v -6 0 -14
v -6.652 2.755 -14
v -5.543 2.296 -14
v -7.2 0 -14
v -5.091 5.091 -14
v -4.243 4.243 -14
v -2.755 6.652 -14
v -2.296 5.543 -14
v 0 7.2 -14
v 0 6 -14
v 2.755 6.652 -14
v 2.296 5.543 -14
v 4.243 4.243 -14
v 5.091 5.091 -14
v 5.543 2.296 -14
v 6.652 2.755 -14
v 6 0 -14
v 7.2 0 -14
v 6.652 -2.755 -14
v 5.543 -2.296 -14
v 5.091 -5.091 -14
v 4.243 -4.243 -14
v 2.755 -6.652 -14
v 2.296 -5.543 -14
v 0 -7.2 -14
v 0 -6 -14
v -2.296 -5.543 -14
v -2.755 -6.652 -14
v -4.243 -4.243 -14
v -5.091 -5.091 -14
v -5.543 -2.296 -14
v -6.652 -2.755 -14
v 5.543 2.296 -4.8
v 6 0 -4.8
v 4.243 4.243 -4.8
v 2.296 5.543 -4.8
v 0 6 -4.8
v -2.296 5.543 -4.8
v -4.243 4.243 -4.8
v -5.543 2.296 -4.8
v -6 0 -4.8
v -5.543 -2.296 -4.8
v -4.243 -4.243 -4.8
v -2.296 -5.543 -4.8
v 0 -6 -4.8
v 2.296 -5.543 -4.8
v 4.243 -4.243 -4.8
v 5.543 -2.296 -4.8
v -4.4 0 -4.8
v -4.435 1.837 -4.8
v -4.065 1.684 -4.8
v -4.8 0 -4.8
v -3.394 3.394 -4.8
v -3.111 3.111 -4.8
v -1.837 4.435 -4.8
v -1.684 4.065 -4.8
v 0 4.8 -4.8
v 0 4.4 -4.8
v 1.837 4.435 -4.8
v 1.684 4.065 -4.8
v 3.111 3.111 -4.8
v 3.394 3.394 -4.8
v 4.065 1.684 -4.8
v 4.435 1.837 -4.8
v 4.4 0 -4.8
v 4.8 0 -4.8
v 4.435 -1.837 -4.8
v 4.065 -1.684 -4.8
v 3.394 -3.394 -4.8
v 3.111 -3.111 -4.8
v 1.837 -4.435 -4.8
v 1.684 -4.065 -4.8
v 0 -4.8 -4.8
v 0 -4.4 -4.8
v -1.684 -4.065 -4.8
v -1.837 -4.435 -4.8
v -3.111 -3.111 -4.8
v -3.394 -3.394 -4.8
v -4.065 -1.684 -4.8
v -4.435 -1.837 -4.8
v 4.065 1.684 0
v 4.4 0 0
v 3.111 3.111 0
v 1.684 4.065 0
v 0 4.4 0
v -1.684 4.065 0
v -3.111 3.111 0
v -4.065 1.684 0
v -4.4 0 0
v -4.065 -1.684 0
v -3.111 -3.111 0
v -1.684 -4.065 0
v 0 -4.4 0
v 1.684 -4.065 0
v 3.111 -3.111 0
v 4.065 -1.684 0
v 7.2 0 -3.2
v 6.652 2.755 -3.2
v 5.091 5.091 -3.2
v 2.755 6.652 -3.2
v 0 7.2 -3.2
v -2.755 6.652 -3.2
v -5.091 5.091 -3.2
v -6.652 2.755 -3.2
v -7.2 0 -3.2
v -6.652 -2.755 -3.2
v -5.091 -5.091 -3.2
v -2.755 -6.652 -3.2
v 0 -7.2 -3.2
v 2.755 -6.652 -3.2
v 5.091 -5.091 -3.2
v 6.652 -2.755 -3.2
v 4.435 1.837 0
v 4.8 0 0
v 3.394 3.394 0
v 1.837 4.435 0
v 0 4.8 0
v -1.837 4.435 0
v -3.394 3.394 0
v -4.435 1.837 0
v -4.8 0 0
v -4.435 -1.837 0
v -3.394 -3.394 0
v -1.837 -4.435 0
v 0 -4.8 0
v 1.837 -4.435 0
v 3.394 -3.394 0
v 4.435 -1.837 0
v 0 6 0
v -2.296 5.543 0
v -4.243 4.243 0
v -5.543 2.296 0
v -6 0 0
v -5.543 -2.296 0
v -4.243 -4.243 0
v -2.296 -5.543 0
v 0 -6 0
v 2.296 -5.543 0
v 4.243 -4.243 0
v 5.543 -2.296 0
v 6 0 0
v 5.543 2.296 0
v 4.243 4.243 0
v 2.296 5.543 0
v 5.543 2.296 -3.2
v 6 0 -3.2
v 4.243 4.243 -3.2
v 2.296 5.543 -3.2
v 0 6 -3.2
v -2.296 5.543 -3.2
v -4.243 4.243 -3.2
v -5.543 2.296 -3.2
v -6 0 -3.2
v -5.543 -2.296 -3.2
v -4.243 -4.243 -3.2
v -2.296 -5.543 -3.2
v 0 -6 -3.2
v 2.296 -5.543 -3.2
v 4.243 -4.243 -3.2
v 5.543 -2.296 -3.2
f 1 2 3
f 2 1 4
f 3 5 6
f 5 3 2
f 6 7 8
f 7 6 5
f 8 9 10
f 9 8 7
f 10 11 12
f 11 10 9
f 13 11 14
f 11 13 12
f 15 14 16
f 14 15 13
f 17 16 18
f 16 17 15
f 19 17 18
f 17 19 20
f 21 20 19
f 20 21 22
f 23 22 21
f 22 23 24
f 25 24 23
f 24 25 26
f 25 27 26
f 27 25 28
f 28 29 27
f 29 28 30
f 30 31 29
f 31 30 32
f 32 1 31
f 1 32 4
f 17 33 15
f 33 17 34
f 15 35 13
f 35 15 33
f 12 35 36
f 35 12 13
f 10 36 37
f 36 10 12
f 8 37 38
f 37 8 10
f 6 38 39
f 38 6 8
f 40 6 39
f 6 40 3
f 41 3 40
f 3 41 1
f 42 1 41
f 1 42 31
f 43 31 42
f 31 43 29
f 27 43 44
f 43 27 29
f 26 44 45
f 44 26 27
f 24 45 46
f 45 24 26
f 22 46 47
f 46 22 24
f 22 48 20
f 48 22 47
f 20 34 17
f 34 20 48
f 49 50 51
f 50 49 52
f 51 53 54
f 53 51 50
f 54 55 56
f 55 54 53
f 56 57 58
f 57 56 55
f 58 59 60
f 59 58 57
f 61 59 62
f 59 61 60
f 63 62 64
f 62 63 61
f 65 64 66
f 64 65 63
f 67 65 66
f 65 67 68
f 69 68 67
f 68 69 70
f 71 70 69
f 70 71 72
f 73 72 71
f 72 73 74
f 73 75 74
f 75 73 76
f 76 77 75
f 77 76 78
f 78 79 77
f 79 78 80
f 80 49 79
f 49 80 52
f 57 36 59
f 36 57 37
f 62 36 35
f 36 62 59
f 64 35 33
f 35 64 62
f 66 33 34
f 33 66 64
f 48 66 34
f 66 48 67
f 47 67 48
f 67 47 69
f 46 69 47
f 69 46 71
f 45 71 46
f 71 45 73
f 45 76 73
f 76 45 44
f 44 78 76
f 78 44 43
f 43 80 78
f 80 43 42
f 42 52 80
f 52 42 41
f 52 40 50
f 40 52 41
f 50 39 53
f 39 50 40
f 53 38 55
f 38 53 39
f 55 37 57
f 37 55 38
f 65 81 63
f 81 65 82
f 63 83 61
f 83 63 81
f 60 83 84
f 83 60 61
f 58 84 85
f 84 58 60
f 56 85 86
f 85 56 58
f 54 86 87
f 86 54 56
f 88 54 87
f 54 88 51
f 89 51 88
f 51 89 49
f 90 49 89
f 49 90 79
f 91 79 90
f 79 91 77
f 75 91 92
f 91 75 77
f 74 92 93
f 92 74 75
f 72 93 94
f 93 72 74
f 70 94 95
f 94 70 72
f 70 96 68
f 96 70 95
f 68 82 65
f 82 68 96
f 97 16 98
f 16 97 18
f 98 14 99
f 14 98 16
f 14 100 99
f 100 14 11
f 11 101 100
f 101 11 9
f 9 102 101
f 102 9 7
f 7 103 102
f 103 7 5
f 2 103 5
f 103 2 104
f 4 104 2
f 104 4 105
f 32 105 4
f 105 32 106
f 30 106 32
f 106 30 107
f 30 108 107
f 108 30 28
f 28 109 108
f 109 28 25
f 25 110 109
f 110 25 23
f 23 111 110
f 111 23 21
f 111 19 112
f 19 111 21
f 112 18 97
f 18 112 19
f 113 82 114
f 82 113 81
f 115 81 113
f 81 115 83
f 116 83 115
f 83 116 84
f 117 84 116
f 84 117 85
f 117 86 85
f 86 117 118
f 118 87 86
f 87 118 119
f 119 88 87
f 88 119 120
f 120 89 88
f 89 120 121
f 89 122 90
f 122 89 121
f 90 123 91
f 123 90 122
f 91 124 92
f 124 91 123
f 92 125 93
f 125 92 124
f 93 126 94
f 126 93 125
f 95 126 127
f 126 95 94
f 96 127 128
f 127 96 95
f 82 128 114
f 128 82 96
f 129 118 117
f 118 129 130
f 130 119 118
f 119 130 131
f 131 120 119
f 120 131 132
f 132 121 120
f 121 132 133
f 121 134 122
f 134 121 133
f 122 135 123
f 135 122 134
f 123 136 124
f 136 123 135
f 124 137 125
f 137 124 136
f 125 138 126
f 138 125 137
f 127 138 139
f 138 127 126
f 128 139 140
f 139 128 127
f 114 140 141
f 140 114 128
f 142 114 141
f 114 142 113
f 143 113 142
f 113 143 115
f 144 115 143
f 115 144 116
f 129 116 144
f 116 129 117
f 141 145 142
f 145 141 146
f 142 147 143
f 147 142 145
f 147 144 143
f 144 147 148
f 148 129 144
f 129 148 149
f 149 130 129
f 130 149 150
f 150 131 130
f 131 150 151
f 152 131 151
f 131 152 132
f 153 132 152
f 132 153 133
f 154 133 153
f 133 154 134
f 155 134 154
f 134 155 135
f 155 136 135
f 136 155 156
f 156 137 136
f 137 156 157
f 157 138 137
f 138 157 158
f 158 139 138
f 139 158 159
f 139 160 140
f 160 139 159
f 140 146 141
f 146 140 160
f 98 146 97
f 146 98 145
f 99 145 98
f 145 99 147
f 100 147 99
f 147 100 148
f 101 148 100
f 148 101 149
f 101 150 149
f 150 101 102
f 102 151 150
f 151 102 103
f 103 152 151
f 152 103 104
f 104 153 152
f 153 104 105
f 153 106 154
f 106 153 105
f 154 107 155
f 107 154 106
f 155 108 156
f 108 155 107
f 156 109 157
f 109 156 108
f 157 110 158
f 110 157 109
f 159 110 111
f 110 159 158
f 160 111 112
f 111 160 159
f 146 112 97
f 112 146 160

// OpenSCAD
// file: ../p/4-4ring5.scad
use <../lib.scad>
function ldraw_lib__4_4ring5() = [
// 0 Ring  5 x 1.0
// 0 Name: 4-4ring5.dat
// 0 Author: Mark Kennedy [mkennedy]
// 0 !LDRAW_ORG Primitive UPDATE 2012-01
// 0 !LICENSE Licensed under CC BY 4.0 : see CAreadme.txt
// 
// 0 BFC CERTIFY CCW
  [0,"BFC","CERTIFY"],
  [0,"BFC","CCW"],
// 
// 0 !HISTORY 2001-10-23 [pneaster] resequenced quads, corrected winding.
// 0 !HISTORY 2001-12-29 [pneaster] Added BFC.
// 0 !HISTORY 2002-04-25 [PTadmin] Official Update 2002-02
// 0 !HISTORY 2007-06-24 [PTadmin] Header formatted for Contributor Agreement
// 0 !HISTORY 2008-07-01 [PTadmin] Official Update 2008-01
// 0 !HISTORY 2012-02-16 [Philo] Changed to CCW
// 0 !HISTORY 2012-03-30 [PTadmin] Official Update 2012-01
// 
// 
// 4 16 6 0 0 5.5433 0 2.2961 4.6195 0 1.9135 5 0 0
  [4,16,6,0,0,5.5433,0,2.2961,4.6195,0,1.9135,5,0,0],
// 4 16 5.5433 0 2.2961 4.2426 0 4.2426 3.5355 0 3.5355 4.6195 0 1.9135
  [4,16,5.5433,0,2.2961,4.2426,0,4.2426,3.5355,0,3.5355,4.6195,0,1.9135],
// 4 16 4.2426 0 4.2426 2.2961 0 5.5433 1.9135 0 4.6195 3.5355 0 3.5355
  [4,16,4.2426,0,4.2426,2.2961,0,5.5433,1.9135,0,4.6195,3.5355,0,3.5355],
// 4 16 2.2961 0 5.5433 0 0 6 0 0 5 1.9135 0 4.6195
  [4,16,2.2961,0,5.5433,0,0,6,0,0,5,1.9135,0,4.6195],
// 4 16 0 0 6 -2.2961 0 5.5433 -1.9135 0 4.6195 0 0 5
  [4,16,0,0,6,-2.2961,0,5.5433,-1.9135,0,4.6195,0,0,5],
// 4 16 -2.2961 0 5.5433 -4.2426 0 4.2426 -3.5355 0 3.5355 -1.9135 0 4.6195
  [4,16,-2.2961,0,5.5433,-4.2426,0,4.2426,-3.5355,0,3.5355,-1.9135,0,4.6195],
// 4 16 -4.2426 0 4.2426 -5.5433 0 2.2961 -4.6195 0 1.9135 -3.5355 0 3.5355
  [4,16,-4.2426,0,4.2426,-5.5433,0,2.2961,-4.6195,0,1.9135,-3.5355,0,3.5355],
// 4 16 -5.5433 0 2.2961 -6 0 0 -5 0 0 -4.6195 0 1.9135
  [4,16,-5.5433,0,2.2961,-6,0,0,-5,0,0,-4.6195,0,1.9135],
// 4 16 -6 0 0 -5.5433 0 -2.2961 -4.6195 0 -1.9135 -5 0 0
  [4,16,-6,0,0,-5.5433,0,-2.2961,-4.6195,0,-1.9135,-5,0,0],
// 4 16 -5.5433 0 -2.2961 -4.2426 0 -4.2426 -3.5355 0 -3.5355 -4.6195 0 -1.9135
  [4,16,-5.5433,0,-2.2961,-4.2426,0,-4.2426,-3.5355,0,-3.5355,-4.6195,0,-1.9135],
// 4 16 -4.2426 0 -4.2426 -2.2961 0 -5.5433 -1.9135 0 -4.6195 -3.5355 0 -3.5355
  [4,16,-4.2426,0,-4.2426,-2.2961,0,-5.5433,-1.9135,0,-4.6195,-3.5355,0,-3.5355],
// 4 16 -2.2961 0 -5.5433 0 0 -6 0 0 -5 -1.9135 0 -4.6195
  [4,16,-2.2961,0,-5.5433,0,0,-6,0,0,-5,-1.9135,0,-4.6195],
// 4 16 0 0 -6 2.2961 0 -5.5433 1.9135 0 -4.6195 0 0 -5
  [4,16,0,0,-6,2.2961,0,-5.5433,1.9135,0,-4.6195,0,0,-5],
// 4 16 2.2961 0 -5.5433 4.2426 0 -4.2426 3.5355 0 -3.5355 1.9135 0 -4.6195
  [4,16,2.2961,0,-5.5433,4.2426,0,-4.2426,3.5355,0,-3.5355,1.9135,0,-4.6195],
// 4 16 4.2426 0 -4.2426 5.5433 0 -2.2961 4.6195 0 -1.9135 3.5355 0 -3.5355
  [4,16,4.2426,0,-4.2426,5.5433,0,-2.2961,4.6195,0,-1.9135,3.5355,0,-3.5355],
// 4 16 5.5433 0 -2.2961 6 0 0 5 0 0 4.6195 0 -1.9135
  [4,16,5.5433,0,-2.2961,6,0,0,5,0,0,4.6195,0,-1.9135],
];
module ldraw_lib__4_4ring5(step=0, col=false, unit=2/5, alt=false, line=0.2, solid=!$preview)
    makepoly(ldraw_lib__4_4ring5(), step=step, col=col, unit=unit, alt=alt, line=line, solid=solid);
ldraw_lib__4_4ring5(line=0.2);
// file: ../p/4-4ring4.scad
use <../lib.scad>
function ldraw_lib__4_4ring4() = [
// 0 Ring  4 x 1.0
// 0 Name: 4-4ring4.dat
// 0 Author: James Jessiman
// 0 !LDRAW_ORG Primitive UPDATE 2009-01
// 0 !LICENSE Licensed under CC BY 4.0 : see CAreadme.txt
// 
// 0 BFC CERTIFY CCW
  [0,"BFC","CERTIFY"],
  [0,"BFC","CCW"],
// 
// 0 !HISTORY 1998-12-15 [PTadmin] Official Update 1998-10
// 0 !HISTORY 2002-04-08 [BrickCaster] Modified for BFC compliance
// 0 !HISTORY 2002-04-25 [PTadmin] Official Update 2002-02
// 0 !HISTORY 2007-06-24 [PTadmin] Header formatted for Contributor Agreement
// 0 !HISTORY 2008-07-01 [PTadmin] Official Update 2008-01
// 0 !HISTORY 2008-08-26 [cwdee] Switch polygon winding and rename
// 0 !HISTORY 2009-05-02 [PTadmin] Official Update 2009-01
// 
// 
// 4 16 -1.9135 0 4.6195 -1.5308 0 3.6956 0 0 4 0 0 5
  [4,16,-1.9135,0,4.6195,-1.5308,0,3.6956,0,0,4,0,0,5],
// 4 16 -3.5355 0 3.5355 -2.8284 0 2.8284 -1.5308 0 3.6956 -1.9135 0 4.6195
  [4,16,-3.5355,0,3.5355,-2.8284,0,2.8284,-1.5308,0,3.6956,-1.9135,0,4.6195],
// 4 16 -4.6195 0 1.9135 -3.6956 0 1.5308 -2.8284 0 2.8284 -3.5355 0 3.5355
  [4,16,-4.6195,0,1.9135,-3.6956,0,1.5308,-2.8284,0,2.8284,-3.5355,0,3.5355],
// 4 16 -5 0 0 -4 0 0 -3.6956 0 1.5308 -4.6195 0 1.9135
  [4,16,-5,0,0,-4,0,0,-3.6956,0,1.5308,-4.6195,0,1.9135],
// 4 16 -4.6195 0 -1.9135 -3.6956 0 -1.5308 -4 0 0 -5 0 0
  [4,16,-4.6195,0,-1.9135,-3.6956,0,-1.5308,-4,0,0,-5,0,0],
// 4 16 -3.5355 0 -3.5355 -2.8284 0 -2.8284 -3.6956 0 -1.5308 -4.6195 0 -1.9135
  [4,16,-3.5355,0,-3.5355,-2.8284,0,-2.8284,-3.6956,0,-1.5308,-4.6195,0,-1.9135],
// 4 16 -1.9135 0 -4.6195 -1.5308 0 -3.6956 -2.8284 0 -2.8284 -3.5355 0 -3.5355
  [4,16,-1.9135,0,-4.6195,-1.5308,0,-3.6956,-2.8284,0,-2.8284,-3.5355,0,-3.5355],
// 4 16 0 0 -5 0 0 -4 -1.5308 0 -3.6956 -1.9135 0 -4.6195
  [4,16,0,0,-5,0,0,-4,-1.5308,0,-3.6956,-1.9135,0,-4.6195],
// 4 16 1.9135 0 -4.6195 1.5308 0 -3.6956 0 0 -4 0 0 -5
  [4,16,1.9135,0,-4.6195,1.5308,0,-3.6956,0,0,-4,0,0,-5],
// 4 16 3.5355 0 -3.5355 2.8284 0 -2.8284 1.5308 0 -3.6956 1.9135 0 -4.6195
  [4,16,3.5355,0,-3.5355,2.8284,0,-2.8284,1.5308,0,-3.6956,1.9135,0,-4.6195],
// 4 16 4.6195 0 -1.9135 3.6956 0 -1.5308 2.8284 0 -2.8284 3.5355 0 -3.5355
  [4,16,4.6195,0,-1.9135,3.6956,0,-1.5308,2.8284,0,-2.8284,3.5355,0,-3.5355],
// 4 16 5 0 0 4 0 0 3.6956 0 -1.5308 4.6195 0 -1.9135
  [4,16,5,0,0,4,0,0,3.6956,0,-1.5308,4.6195,0,-1.9135],
// 4 16 4.6195 0 1.9135 3.6956 0 1.5308 4 0 0 5 0 0
  [4,16,4.6195,0,1.9135,3.6956,0,1.5308,4,0,0,5,0,0],
// 4 16 3.5355 0 3.5355 2.8284 0 2.8284 3.6956 0 1.5308 4.6195 0 1.9135
  [4,16,3.5355,0,3.5355,2.8284,0,2.8284,3.6956,0,1.5308,4.6195,0,1.9135],
// 4 16 1.9135 0 4.6195 1.5308 0 3.6956 2.8284 0 2.8284 3.5355 0 3.5355
  [4,16,1.9135,0,4.6195,1.5308,0,3.6956,2.8284,0,2.8284,3.5355,0,3.5355],
// 4 16 0 0 5 0 0 4 1.5308 0 3.6956 1.9135 0 4.6195
  [4,16,0,0,5,0,0,4,1.5308,0,3.6956,1.9135,0,4.6195],
// 0
];
module ldraw_lib__4_4ring4(step=0, col=false, unit=2/5, alt=false, line=0.2, solid=!$preview)
    makepoly(ldraw_lib__4_4ring4(), step=step, col=col, unit=unit, alt=alt, line=line, solid=solid);
ldraw_lib__4_4ring4(line=0.2);
// file: ../p/4-4ring11.scad
use <../lib.scad>
function ldraw_lib__4_4ring11() = [
// 0 Ring 11 x  1.0
// 0 Name: 4-4ring11.dat
// 0 Author: Willy Tschager [Holly-Wood]
// 0 !LDRAW_ORG Primitive UPDATE 2024-02
// 0 !LICENSE Licensed under CC BY 4.0 : see CAreadme.txt
// 
// 0 BFC CERTIFY CCW
  [0,"BFC","CERTIFY"],
  [0,"BFC","CCW"],
// 
// 0 !HISTORY 2003-12-19 [PTadmin] Official Update 2003-03
// 0 !HISTORY 2007-06-24 [PTadmin] Header formatted for Contributor Agreement
// 0 !HISTORY 2008-07-01 [PTadmin] Official Update 2008-01
// 0 !HISTORY 2024-01-07 [Holly-Wood] Complete regeneration, original by jriley
// 0 !HISTORY 2024-03-24 [OrionP] Official Update 2024-02
// 
// 4 16 12 0 0 11.0868 0 4.5924 10.1629 0 4.2097 11 0 0
  [4,16,12,0,0,11.0868,0,4.5924,10.1629,0,4.2097,11,0,0],
// 4 16 11.0868 0 4.5924 8.4852 0 8.4852 7.7781 0 7.7781 10.1629 0 4.2097
  [4,16,11.0868,0,4.5924,8.4852,0,8.4852,7.7781,0,7.7781,10.1629,0,4.2097],
// 4 16 8.4852 0 8.4852 4.5924 0 11.0868 4.2097 0 10.1629 7.7781 0 7.7781
  [4,16,8.4852,0,8.4852,4.5924,0,11.0868,4.2097,0,10.1629,7.7781,0,7.7781],
// 4 16 4.5924 0 11.0868 0 0 12 0 0 11 4.2097 0 10.1629
  [4,16,4.5924,0,11.0868,0,0,12,0,0,11,4.2097,0,10.1629],
// 4 16 0 0 12 -4.5924 0 11.0868 -4.2097 0 10.1629 0 0 11
  [4,16,0,0,12,-4.5924,0,11.0868,-4.2097,0,10.1629,0,0,11],
// 4 16 -4.5924 0 11.0868 -8.4852 0 8.4852 -7.7781 0 7.7781 -4.2097 0 10.1629
  [4,16,-4.5924,0,11.0868,-8.4852,0,8.4852,-7.7781,0,7.7781,-4.2097,0,10.1629],
// 4 16 -8.4852 0 8.4852 -11.0868 0 4.5924 -10.1629 0 4.2097 -7.7781 0 7.7781
  [4,16,-8.4852,0,8.4852,-11.0868,0,4.5924,-10.1629,0,4.2097,-7.7781,0,7.7781],
// 4 16 -11.0868 0 4.5924 -12 0 0 -11 0 0 -10.1629 0 4.2097
  [4,16,-11.0868,0,4.5924,-12,0,0,-11,0,0,-10.1629,0,4.2097],
// 4 16 -12 0 0 -11.0868 0 -4.5924 -10.1629 0 -4.2097 -11 0 0
  [4,16,-12,0,0,-11.0868,0,-4.5924,-10.1629,0,-4.2097,-11,0,0],
// 4 16 -11.0868 0 -4.5924 -8.4852 0 -8.4852 -7.7781 0 -7.7781 -10.1629 0 -4.2097
  [4,16,-11.0868,0,-4.5924,-8.4852,0,-8.4852,-7.7781,0,-7.7781,-10.1629,0,-4.2097],
// 4 16 -8.4852 0 -8.4852 -4.5924 0 -11.0868 -4.2097 0 -10.1629 -7.7781 0 -7.7781
  [4,16,-8.4852,0,-8.4852,-4.5924,0,-11.0868,-4.2097,0,-10.1629,-7.7781,0,-7.7781],
// 4 16 -4.5924 0 -11.0868 0 0 -12 0 0 -11 -4.2097 0 -10.1629
  [4,16,-4.5924,0,-11.0868,0,0,-12,0,0,-11,-4.2097,0,-10.1629],
// 4 16 0 0 -12 4.5924 0 -11.0868 4.2097 0 -10.1629 0 0 -11
  [4,16,0,0,-12,4.5924,0,-11.0868,4.2097,0,-10.1629,0,0,-11],
// 4 16 4.5924 0 -11.0868 8.4852 0 -8.4852 7.7781 0 -7.7781 4.2097 0 -10.1629
  [4,16,4.5924,0,-11.0868,8.4852,0,-8.4852,7.7781,0,-7.7781,4.2097,0,-10.1629],
// 4 16 8.4852 0 -8.4852 11.0868 0 -4.5924 10.1629 0 -4.2097 7.7781 0 -7.7781
  [4,16,8.4852,0,-8.4852,11.0868,0,-4.5924,10.1629,0,-4.2097,7.7781,0,-7.7781],
// 4 16 11.0868 0 -4.5924 12 0 0 11 0 0 10.1629 0 -4.2097
  [4,16,11.0868,0,-4.5924,12,0,0,11,0,0,10.1629,0,-4.2097],
// 0 // Build by LDPartEditor (PrimGen 2.X)
];
module ldraw_lib__4_4ring11(step=0, col=false, unit=2/5, alt=false, line=0.2, solid=!$preview)
    makepoly(ldraw_lib__4_4ring11(), step=step, col=col, unit=unit, alt=alt, line=line, solid=solid);
ldraw_lib__4_4ring11(line=0.2);
// file: ../p/4-4edge.scad
use <../lib.scad>
function ldraw_lib__4_4edge() = [
// 0 Circle 1.0
// 0 Name: 4-4edge.dat
// 0 Author: James Jessiman
// 0 !LDRAW_ORG Primitive UPDATE 2017-01
// 0 !LICENSE Licensed under CC BY 4.0 : see CAreadme.txt
// 
// 0 BFC CERTIFY CCW
  [0,"BFC","CERTIFY"],
  [0,"BFC","CCW"],
// 
// 0 !HISTORY 1998-12-15 [PTadmin] Official Update 1998-10
// 0 !HISTORY 2005-12-28 [PTadmin] Official Update 2005-01
// 0 !HISTORY 2007-06-24 [PTadmin] Header formatted for Contributor Agreement
// 0 !HISTORY 2008-07-01 [PTadmin] Official Update 2008-01
// 0 !HISTORY 2017-01-15 [Steffen] BFCed
// 0 !HISTORY 2017-12-30 [PTadmin] Official Update 2017-01
// 
// 
// 2 24 1 0 0 0.9239 0 0.3827
  [2,24,1,0,0,0.9239,0,0.3827],
// 2 24 0.9239 0 0.3827 0.7071 0 0.7071
  [2,24,0.9239,0,0.3827,0.7071,0,0.7071],
// 2 24 0.7071 0 0.7071 0.3827 0 0.9239
  [2,24,0.7071,0,0.7071,0.3827,0,0.9239],
// 2 24 0.3827 0 0.9239 0 0 1
  [2,24,0.3827,0,0.9239,0,0,1],
// 2 24 0 0 1 -0.3827 0 0.9239
  [2,24,0,0,1,-0.3827,0,0.9239],
// 2 24 -0.3827 0 0.9239 -0.7071 0 0.7071
  [2,24,-0.3827,0,0.9239,-0.7071,0,0.7071],
// 2 24 -0.7071 0 0.7071 -0.9239 0 0.3827
  [2,24,-0.7071,0,0.7071,-0.9239,0,0.3827],
// 2 24 -0.9239 0 0.3827 -1 0 -0
  [2,24,-0.9239,0,0.3827,-1,0,-0],
// 2 24 -1 0 -0 -0.9239 0 -0.3827
  [2,24,-1,0,-0,-0.9239,0,-0.3827],
// 2 24 -0.9239 0 -0.3827 -0.7071 0 -0.7071
  [2,24,-0.9239,0,-0.3827,-0.7071,0,-0.7071],
// 2 24 -0.7071 0 -0.7071 -0.3827 0 -0.9239
  [2,24,-0.7071,0,-0.7071,-0.3827,0,-0.9239],
// 2 24 -0.3827 0 -0.9239 0 0 -1
  [2,24,-0.3827,0,-0.9239,0,0,-1],
// 2 24 0 0 -1 0.3827 0 -0.9239
  [2,24,0,0,-1,0.3827,0,-0.9239],
// 2 24 0.3827 0 -0.9239 0.7071 0 -0.7071
  [2,24,0.3827,0,-0.9239,0.7071,0,-0.7071],
// 2 24 0.7071 0 -0.7071 0.9239 0 -0.3827
  [2,24,0.7071,0,-0.7071,0.9239,0,-0.3827],
// 2 24 0.9239 0 -0.3827 1 0 0
  [2,24,0.9239,0,-0.3827,1,0,0],
];
module ldraw_lib__4_4edge(step=0, col=false, unit=2/5, alt=false, line=0.2, solid=!$preview)
    makepoly(ldraw_lib__4_4edge(), step=step, col=col, unit=unit, alt=alt, line=line, solid=solid);
ldraw_lib__4_4edge(line=0.2);
// file: ../p/4-4cyli.scad
use <../lib.scad>
function ldraw_lib__4_4cyli() = [
// 0 Cylinder 1.0
// 0 Name: 4-4cyli.dat
// 0 Author: James Jessiman
// 0 !LDRAW_ORG Primitive UPDATE 2005-01
// 0 !LICENSE Licensed under CC BY 4.0 : see CAreadme.txt
// 
// 0 BFC CERTIFY CCW
  [0,"BFC","CERTIFY"],
  [0,"BFC","CCW"],
// 
// 0 !HISTORY 1998-12-15 [PTadmin] Official Update 1998-10
// 0 !HISTORY 2002-03-23 [sbliss] Added BFC statement; merged headers from files in distributions LDraw 0.27 and Complete.
// 0 !HISTORY 2002-04-25 [PTadmin] Official Update 2002-02
// 0 !HISTORY 2004-12-14 [guyvivan] BFC CCW
// 0 !HISTORY 2005-12-28 [PTadmin] Official Update 2005-01
// 0 !HISTORY 2007-06-24 [PTadmin] Header formatted for Contributor Agreement
// 0 !HISTORY 2008-07-01 [PTadmin] Official Update 2008-01
// 
// 
// 4 16 1 1 0 0.9239 1 0.3827 0.9239 0 0.3827 1 0 0
  [4,16,1,1,0,0.9239,1,0.3827,0.9239,0,0.3827,1,0,0],
// 5 24 1 0 0 1 1 0 0.9239 0 0.3827 0.9239 0 -0.3827
  [5,24,1,0,0,1,1,0,0.9239,0,0.3827,0.9239,0,-0.3827],
// 4 16 0.9239 1 0.3827 0.7071 1 0.7071 0.7071 0 0.7071 0.9239 0 0.3827
  [4,16,0.9239,1,0.3827,0.7071,1,0.7071,0.7071,0,0.7071,0.9239,0,0.3827],
// 5 24 0.9239 0 0.3827 0.9239 1 0.3827 0.7071 0 0.7071 1 0 0
  [5,24,0.9239,0,0.3827,0.9239,1,0.3827,0.7071,0,0.7071,1,0,0],
// 4 16 0.7071 1 0.7071 0.3827 1 0.9239 0.3827 0 0.9239 0.7071 0 0.7071
  [4,16,0.7071,1,0.7071,0.3827,1,0.9239,0.3827,0,0.9239,0.7071,0,0.7071],
// 5 24 0.7071 0 0.7071 0.7071 1 0.7071 0.3827 0 0.9239 0.9239 0 0.3827
  [5,24,0.7071,0,0.7071,0.7071,1,0.7071,0.3827,0,0.9239,0.9239,0,0.3827],
// 4 16 0.3827 1 0.9239 0 1 1 0 0 1 0.3827 0 0.9239
  [4,16,0.3827,1,0.9239,0,1,1,0,0,1,0.3827,0,0.9239],
// 5 24 0.3827 0 0.9239 0.3827 1 0.9239 0 0 1 0.7071 0 0.7071
  [5,24,0.3827,0,0.9239,0.3827,1,0.9239,0,0,1,0.7071,0,0.7071],
// 4 16 0 1 1 -0.3827 1 0.9239 -0.3827 0 0.9239 0 0 1
  [4,16,0,1,1,-0.3827,1,0.9239,-0.3827,0,0.9239,0,0,1],
// 5 24 0 0 1 0 1 1 -0.3827 0 0.9239 0.3827 0 0.9239
  [5,24,0,0,1,0,1,1,-0.3827,0,0.9239,0.3827,0,0.9239],
// 4 16 -0.3827 1 0.9239 -0.7071 1 0.7071 -0.7071 0 0.7071 -0.3827 0 0.9239
  [4,16,-0.3827,1,0.9239,-0.7071,1,0.7071,-0.7071,0,0.7071,-0.3827,0,0.9239],
// 5 24 -0.3827 0 0.9239 -0.3827 1 0.9239 -0.7071 0 0.7071 0 0 1
  [5,24,-0.3827,0,0.9239,-0.3827,1,0.9239,-0.7071,0,0.7071,0,0,1],
// 4 16 -0.7071 1 0.7071 -0.9239 1 0.3827 -0.9239 0 0.3827 -0.7071 0 0.7071
  [4,16,-0.7071,1,0.7071,-0.9239,1,0.3827,-0.9239,0,0.3827,-0.7071,0,0.7071],
// 5 24 -0.7071 0 0.7071 -0.7071 1 0.7071 -0.9239 0 0.3827 -0.3827 0 0.9239
  [5,24,-0.7071,0,0.7071,-0.7071,1,0.7071,-0.9239,0,0.3827,-0.3827,0,0.9239],
// 4 16 -0.9239 1 0.3827 -1 1 0 -1 0 0 -0.9239 0 0.3827
  [4,16,-0.9239,1,0.3827,-1,1,0,-1,0,0,-0.9239,0,0.3827],
// 5 24 -0.9239 0 0.3827 -0.9239 1 0.3827 -1 0 0 -0.7071 0 0.7071
  [5,24,-0.9239,0,0.3827,-0.9239,1,0.3827,-1,0,0,-0.7071,0,0.7071],
// 4 16 -1 1 0 -0.9239 1 -0.3827 -0.9239 0 -0.3827 -1 0 0
  [4,16,-1,1,0,-0.9239,1,-0.3827,-0.9239,0,-0.3827,-1,0,0],
// 5 24 -1 0 0 -1 1 0 -0.9239 0 -0.3827 -0.9239 0 0.3827
  [5,24,-1,0,0,-1,1,0,-0.9239,0,-0.3827,-0.9239,0,0.3827],
// 4 16 -0.9239 1 -0.3827 -0.7071 1 -0.7071 -0.7071 0 -0.7071 -0.9239 0 -0.3827
  [4,16,-0.9239,1,-0.3827,-0.7071,1,-0.7071,-0.7071,0,-0.7071,-0.9239,0,-0.3827],
// 5 24 -0.9239 0 -0.3827 -0.9239 1 -0.3827 -0.7071 0 -0.7071 -1 0 0
  [5,24,-0.9239,0,-0.3827,-0.9239,1,-0.3827,-0.7071,0,-0.7071,-1,0,0],
// 4 16 -0.7071 1 -0.7071 -0.3827 1 -0.9239 -0.3827 0 -0.9239 -0.7071 0 -0.7071
  [4,16,-0.7071,1,-0.7071,-0.3827,1,-0.9239,-0.3827,0,-0.9239,-0.7071,0,-0.7071],
// 5 24 -0.7071 0 -0.7071 -0.7071 1 -0.7071 -0.3827 0 -0.9239 -0.9239 0 -0.3827
  [5,24,-0.7071,0,-0.7071,-0.7071,1,-0.7071,-0.3827,0,-0.9239,-0.9239,0,-0.3827],
// 4 16 -0.3827 1 -0.9239 0 1 -1 0 0 -1 -0.3827 0 -0.9239
  [4,16,-0.3827,1,-0.9239,0,1,-1,0,0,-1,-0.3827,0,-0.9239],
// 5 24 -0.3827 0 -0.9239 -0.3827 1 -0.9239 0 0 -1 -0.7071 0 -0.7071
  [5,24,-0.3827,0,-0.9239,-0.3827,1,-0.9239,0,0,-1,-0.7071,0,-0.7071],
// 4 16 0 1 -1 0.3827 1 -0.9239 0.3827 0 -0.9239 0 0 -1
  [4,16,0,1,-1,0.3827,1,-0.9239,0.3827,0,-0.9239,0,0,-1],
// 5 24 0 0 -1 0 1 -1 0.3827 0 -0.9239 -0.3827 0 -0.9239
  [5,24,0,0,-1,0,1,-1,0.3827,0,-0.9239,-0.3827,0,-0.9239],
// 4 16 0.3827 1 -0.9239 0.7071 1 -0.7071 0.7071 0 -0.7071 0.3827 0 -0.9239
  [4,16,0.3827,1,-0.9239,0.7071,1,-0.7071,0.7071,0,-0.7071,0.3827,0,-0.9239],
// 5 24 0.3827 0 -0.9239 0.3827 1 -0.9239 0.7071 0 -0.7071 0 0 -1
  [5,24,0.3827,0,-0.9239,0.3827,1,-0.9239,0.7071,0,-0.7071,0,0,-1],
// 4 16 0.7071 1 -0.7071 0.9239 1 -0.3827 0.9239 0 -0.3827 0.7071 0 -0.7071
  [4,16,0.7071,1,-0.7071,0.9239,1,-0.3827,0.9239,0,-0.3827,0.7071,0,-0.7071],
// 5 24 0.7071 0 -0.7071 0.7071 1 -0.7071 0.9239 0 -0.3827 0.3827 0 -0.9239
  [5,24,0.7071,0,-0.7071,0.7071,1,-0.7071,0.9239,0,-0.3827,0.3827,0,-0.9239],
// 4 16 0.9239 1 -0.3827 1 1 0 1 0 0 0.9239 0 -0.3827
  [4,16,0.9239,1,-0.3827,1,1,0,1,0,0,0.9239,0,-0.3827],
// 5 24 0.9239 0 -0.3827 0.9239 1 -0.3827 1 0 0 0.7071 0 -0.7071
  [5,24,0.9239,0,-0.3827,0.9239,1,-0.3827,1,0,0,0.7071,0,-0.7071],
// 0
];
module ldraw_lib__4_4cyli(step=0, col=false, unit=2/5, alt=false, line=0.2, solid=!$preview)
    makepoly(ldraw_lib__4_4cyli(), step=step, col=col, unit=unit, alt=alt, line=line, solid=solid);
ldraw_lib__4_4cyli(line=0.2);
// main file
use <../lib.scad>
use <../p/4-4cyli.scad>
use <../p/4-4edge.scad>
use <../p/4-4ring11.scad>
use <../p/4-4ring4.scad>
use <../p/4-4ring5.scad>
function ldraw_lib__56474() = [
// 0 ~Electric Mindstorms NXT Ultrasonic Sensor Flexible Insert
// 0 Name: 56474.dat
// 0 Author: Steve Bliss [sbliss]
// 0 !LDRAW_ORG Part UPDATE 2024-02
// 0 !LICENSE Licensed under CC BY 4.0 : see CAreadme.txt
// 
// 0 BFC CERTIFY CCW
  [0,"BFC","CERTIFY"],
  [0,"BFC","CCW"],
// 
// 0 !HISTORY 2007-11-08 [Philo] Tuned dimensions, use correct name
// 0 !HISTORY 2012-03-30 [PTadmin] Official Update 2012-01
// 0 !HISTORY 2024-03-23 [OrionP] Updated ring primitives
// 0 !HISTORY 2024-03-24 [OrionP] Official Update 2024-02
// 
// 1 16 0 0 0 11 0 0 0 1 0 0 0 11 4-4edge.dat
  [1,16,0,0,0,11,0,0,0,1,0,0,0,11, ldraw_lib__4_4edge()],
// 1 16 0 0 0 15 0 0 0 1 0 0 0 15 4-4edge.dat
  [1,16,0,0,0,15,0,0,0,1,0,0,0,15, ldraw_lib__4_4edge()],
// 1 16 0 8 0 15 0 0 0 1 0 0 0 15 4-4edge.dat
  [1,16,0,8,0,15,0,0,0,1,0,0,0,15, ldraw_lib__4_4edge()],
// 1 16 0 12 0 11 0 0 0 1 0 0 0 11 4-4edge.dat
  [1,16,0,12,0,11,0,0,0,1,0,0,0,11, ldraw_lib__4_4edge()],
// 1 16 0 8 0 18 0 0 0 1 0 0 0 18 4-4edge.dat
  [1,16,0,8,0,18,0,0,0,1,0,0,0,18, ldraw_lib__4_4edge()],
// 1 16 0 35 0 18 0 0 0 1 0 0 0 18 4-4edge.dat
  [1,16,0,35,0,18,0,0,0,1,0,0,0,18, ldraw_lib__4_4edge()],
// 1 16 0 35 0 15 0 0 0 1 0 0 0 15 4-4edge.dat
  [1,16,0,35,0,15,0,0,0,1,0,0,0,15, ldraw_lib__4_4edge()],
// 1 16 0 12 0 15 0 0 0 1 0 0 0 15 4-4edge.dat
  [1,16,0,12,0,15,0,0,0,1,0,0,0,15, ldraw_lib__4_4edge()],
// 1 16 0 35 0 -3 0 0 0 -1 0 0 0 3 4-4ring5.dat
  [1,16,0,35,0,-3,0,0,0,-1,0,0,0,3, ldraw_lib__4_4ring5()],
// 0 BFC INVERTNEXT
  [0,"BFC","INVERTNEXT"],
// 1 16 0 12 0 15 0 0 0 23 0 0 0 15 4-4cyli.dat
  [1,16,0,12,0,15,0,0,0,23,0,0,0,15, ldraw_lib__4_4cyli()],
// 1 16 0 12 0 -1 0 0 0 -1 0 0 0 1 4-4ring11.dat
  [1,16,0,12,0,-1,0,0,0,-1,0,0,0,1, ldraw_lib__4_4ring11()],
// 1 16 0 12 0 -3 0 0 0 -1 0 0 0 3 4-4ring4.dat
  [1,16,0,12,0,-3,0,0,0,-1,0,0,0,3, ldraw_lib__4_4ring4()],
// 0 BFC INVERTNEXT
  [0,"BFC","INVERTNEXT"],
// 1 16 0 0 0 11 0 0 0 12 0 0 0 11 4-4cyli.dat
  [1,16,0,0,0,11,0,0,0,12,0,0,0,11, ldraw_lib__4_4cyli()],
// 1 16 0 8 0 18 0 0 0 27 0 0 0 18 4-4cyli.dat
  [1,16,0,8,0,18,0,0,0,27,0,0,0,18, ldraw_lib__4_4cyli()],
// 1 16 0 0 0 1 0 0 0 1 0 0 0 1 4-4ring11.dat
  [1,16,0,0,0,1,0,0,0,1,0,0,0,1, ldraw_lib__4_4ring11()],
// 1 16 0 0 0 3 0 0 0 1 0 0 0 3 4-4ring4.dat
  [1,16,0,0,0,3,0,0,0,1,0,0,0,3, ldraw_lib__4_4ring4()],
// 1 16 0 0 0 15 0 0 0 8 0 0 0 15 4-4cyli.dat
  [1,16,0,0,0,15,0,0,0,8,0,0,0,15, ldraw_lib__4_4cyli()],
// 1 16 0 8 0 3 0 0 0 1 0 0 0 3 4-4ring5.dat
  [1,16,0,8,0,3,0,0,0,1,0,0,0,3, ldraw_lib__4_4ring5()],
// 0
];
module ldraw_lib__56474(step=0, col=false, unit=2/5, alt=false, line=0.2, solid=!$preview)
    makepoly(ldraw_lib__56474(), step=step, col=col, unit=unit, alt=alt, line=line, solid=solid);
ldraw_lib__56474(line=0.2);
